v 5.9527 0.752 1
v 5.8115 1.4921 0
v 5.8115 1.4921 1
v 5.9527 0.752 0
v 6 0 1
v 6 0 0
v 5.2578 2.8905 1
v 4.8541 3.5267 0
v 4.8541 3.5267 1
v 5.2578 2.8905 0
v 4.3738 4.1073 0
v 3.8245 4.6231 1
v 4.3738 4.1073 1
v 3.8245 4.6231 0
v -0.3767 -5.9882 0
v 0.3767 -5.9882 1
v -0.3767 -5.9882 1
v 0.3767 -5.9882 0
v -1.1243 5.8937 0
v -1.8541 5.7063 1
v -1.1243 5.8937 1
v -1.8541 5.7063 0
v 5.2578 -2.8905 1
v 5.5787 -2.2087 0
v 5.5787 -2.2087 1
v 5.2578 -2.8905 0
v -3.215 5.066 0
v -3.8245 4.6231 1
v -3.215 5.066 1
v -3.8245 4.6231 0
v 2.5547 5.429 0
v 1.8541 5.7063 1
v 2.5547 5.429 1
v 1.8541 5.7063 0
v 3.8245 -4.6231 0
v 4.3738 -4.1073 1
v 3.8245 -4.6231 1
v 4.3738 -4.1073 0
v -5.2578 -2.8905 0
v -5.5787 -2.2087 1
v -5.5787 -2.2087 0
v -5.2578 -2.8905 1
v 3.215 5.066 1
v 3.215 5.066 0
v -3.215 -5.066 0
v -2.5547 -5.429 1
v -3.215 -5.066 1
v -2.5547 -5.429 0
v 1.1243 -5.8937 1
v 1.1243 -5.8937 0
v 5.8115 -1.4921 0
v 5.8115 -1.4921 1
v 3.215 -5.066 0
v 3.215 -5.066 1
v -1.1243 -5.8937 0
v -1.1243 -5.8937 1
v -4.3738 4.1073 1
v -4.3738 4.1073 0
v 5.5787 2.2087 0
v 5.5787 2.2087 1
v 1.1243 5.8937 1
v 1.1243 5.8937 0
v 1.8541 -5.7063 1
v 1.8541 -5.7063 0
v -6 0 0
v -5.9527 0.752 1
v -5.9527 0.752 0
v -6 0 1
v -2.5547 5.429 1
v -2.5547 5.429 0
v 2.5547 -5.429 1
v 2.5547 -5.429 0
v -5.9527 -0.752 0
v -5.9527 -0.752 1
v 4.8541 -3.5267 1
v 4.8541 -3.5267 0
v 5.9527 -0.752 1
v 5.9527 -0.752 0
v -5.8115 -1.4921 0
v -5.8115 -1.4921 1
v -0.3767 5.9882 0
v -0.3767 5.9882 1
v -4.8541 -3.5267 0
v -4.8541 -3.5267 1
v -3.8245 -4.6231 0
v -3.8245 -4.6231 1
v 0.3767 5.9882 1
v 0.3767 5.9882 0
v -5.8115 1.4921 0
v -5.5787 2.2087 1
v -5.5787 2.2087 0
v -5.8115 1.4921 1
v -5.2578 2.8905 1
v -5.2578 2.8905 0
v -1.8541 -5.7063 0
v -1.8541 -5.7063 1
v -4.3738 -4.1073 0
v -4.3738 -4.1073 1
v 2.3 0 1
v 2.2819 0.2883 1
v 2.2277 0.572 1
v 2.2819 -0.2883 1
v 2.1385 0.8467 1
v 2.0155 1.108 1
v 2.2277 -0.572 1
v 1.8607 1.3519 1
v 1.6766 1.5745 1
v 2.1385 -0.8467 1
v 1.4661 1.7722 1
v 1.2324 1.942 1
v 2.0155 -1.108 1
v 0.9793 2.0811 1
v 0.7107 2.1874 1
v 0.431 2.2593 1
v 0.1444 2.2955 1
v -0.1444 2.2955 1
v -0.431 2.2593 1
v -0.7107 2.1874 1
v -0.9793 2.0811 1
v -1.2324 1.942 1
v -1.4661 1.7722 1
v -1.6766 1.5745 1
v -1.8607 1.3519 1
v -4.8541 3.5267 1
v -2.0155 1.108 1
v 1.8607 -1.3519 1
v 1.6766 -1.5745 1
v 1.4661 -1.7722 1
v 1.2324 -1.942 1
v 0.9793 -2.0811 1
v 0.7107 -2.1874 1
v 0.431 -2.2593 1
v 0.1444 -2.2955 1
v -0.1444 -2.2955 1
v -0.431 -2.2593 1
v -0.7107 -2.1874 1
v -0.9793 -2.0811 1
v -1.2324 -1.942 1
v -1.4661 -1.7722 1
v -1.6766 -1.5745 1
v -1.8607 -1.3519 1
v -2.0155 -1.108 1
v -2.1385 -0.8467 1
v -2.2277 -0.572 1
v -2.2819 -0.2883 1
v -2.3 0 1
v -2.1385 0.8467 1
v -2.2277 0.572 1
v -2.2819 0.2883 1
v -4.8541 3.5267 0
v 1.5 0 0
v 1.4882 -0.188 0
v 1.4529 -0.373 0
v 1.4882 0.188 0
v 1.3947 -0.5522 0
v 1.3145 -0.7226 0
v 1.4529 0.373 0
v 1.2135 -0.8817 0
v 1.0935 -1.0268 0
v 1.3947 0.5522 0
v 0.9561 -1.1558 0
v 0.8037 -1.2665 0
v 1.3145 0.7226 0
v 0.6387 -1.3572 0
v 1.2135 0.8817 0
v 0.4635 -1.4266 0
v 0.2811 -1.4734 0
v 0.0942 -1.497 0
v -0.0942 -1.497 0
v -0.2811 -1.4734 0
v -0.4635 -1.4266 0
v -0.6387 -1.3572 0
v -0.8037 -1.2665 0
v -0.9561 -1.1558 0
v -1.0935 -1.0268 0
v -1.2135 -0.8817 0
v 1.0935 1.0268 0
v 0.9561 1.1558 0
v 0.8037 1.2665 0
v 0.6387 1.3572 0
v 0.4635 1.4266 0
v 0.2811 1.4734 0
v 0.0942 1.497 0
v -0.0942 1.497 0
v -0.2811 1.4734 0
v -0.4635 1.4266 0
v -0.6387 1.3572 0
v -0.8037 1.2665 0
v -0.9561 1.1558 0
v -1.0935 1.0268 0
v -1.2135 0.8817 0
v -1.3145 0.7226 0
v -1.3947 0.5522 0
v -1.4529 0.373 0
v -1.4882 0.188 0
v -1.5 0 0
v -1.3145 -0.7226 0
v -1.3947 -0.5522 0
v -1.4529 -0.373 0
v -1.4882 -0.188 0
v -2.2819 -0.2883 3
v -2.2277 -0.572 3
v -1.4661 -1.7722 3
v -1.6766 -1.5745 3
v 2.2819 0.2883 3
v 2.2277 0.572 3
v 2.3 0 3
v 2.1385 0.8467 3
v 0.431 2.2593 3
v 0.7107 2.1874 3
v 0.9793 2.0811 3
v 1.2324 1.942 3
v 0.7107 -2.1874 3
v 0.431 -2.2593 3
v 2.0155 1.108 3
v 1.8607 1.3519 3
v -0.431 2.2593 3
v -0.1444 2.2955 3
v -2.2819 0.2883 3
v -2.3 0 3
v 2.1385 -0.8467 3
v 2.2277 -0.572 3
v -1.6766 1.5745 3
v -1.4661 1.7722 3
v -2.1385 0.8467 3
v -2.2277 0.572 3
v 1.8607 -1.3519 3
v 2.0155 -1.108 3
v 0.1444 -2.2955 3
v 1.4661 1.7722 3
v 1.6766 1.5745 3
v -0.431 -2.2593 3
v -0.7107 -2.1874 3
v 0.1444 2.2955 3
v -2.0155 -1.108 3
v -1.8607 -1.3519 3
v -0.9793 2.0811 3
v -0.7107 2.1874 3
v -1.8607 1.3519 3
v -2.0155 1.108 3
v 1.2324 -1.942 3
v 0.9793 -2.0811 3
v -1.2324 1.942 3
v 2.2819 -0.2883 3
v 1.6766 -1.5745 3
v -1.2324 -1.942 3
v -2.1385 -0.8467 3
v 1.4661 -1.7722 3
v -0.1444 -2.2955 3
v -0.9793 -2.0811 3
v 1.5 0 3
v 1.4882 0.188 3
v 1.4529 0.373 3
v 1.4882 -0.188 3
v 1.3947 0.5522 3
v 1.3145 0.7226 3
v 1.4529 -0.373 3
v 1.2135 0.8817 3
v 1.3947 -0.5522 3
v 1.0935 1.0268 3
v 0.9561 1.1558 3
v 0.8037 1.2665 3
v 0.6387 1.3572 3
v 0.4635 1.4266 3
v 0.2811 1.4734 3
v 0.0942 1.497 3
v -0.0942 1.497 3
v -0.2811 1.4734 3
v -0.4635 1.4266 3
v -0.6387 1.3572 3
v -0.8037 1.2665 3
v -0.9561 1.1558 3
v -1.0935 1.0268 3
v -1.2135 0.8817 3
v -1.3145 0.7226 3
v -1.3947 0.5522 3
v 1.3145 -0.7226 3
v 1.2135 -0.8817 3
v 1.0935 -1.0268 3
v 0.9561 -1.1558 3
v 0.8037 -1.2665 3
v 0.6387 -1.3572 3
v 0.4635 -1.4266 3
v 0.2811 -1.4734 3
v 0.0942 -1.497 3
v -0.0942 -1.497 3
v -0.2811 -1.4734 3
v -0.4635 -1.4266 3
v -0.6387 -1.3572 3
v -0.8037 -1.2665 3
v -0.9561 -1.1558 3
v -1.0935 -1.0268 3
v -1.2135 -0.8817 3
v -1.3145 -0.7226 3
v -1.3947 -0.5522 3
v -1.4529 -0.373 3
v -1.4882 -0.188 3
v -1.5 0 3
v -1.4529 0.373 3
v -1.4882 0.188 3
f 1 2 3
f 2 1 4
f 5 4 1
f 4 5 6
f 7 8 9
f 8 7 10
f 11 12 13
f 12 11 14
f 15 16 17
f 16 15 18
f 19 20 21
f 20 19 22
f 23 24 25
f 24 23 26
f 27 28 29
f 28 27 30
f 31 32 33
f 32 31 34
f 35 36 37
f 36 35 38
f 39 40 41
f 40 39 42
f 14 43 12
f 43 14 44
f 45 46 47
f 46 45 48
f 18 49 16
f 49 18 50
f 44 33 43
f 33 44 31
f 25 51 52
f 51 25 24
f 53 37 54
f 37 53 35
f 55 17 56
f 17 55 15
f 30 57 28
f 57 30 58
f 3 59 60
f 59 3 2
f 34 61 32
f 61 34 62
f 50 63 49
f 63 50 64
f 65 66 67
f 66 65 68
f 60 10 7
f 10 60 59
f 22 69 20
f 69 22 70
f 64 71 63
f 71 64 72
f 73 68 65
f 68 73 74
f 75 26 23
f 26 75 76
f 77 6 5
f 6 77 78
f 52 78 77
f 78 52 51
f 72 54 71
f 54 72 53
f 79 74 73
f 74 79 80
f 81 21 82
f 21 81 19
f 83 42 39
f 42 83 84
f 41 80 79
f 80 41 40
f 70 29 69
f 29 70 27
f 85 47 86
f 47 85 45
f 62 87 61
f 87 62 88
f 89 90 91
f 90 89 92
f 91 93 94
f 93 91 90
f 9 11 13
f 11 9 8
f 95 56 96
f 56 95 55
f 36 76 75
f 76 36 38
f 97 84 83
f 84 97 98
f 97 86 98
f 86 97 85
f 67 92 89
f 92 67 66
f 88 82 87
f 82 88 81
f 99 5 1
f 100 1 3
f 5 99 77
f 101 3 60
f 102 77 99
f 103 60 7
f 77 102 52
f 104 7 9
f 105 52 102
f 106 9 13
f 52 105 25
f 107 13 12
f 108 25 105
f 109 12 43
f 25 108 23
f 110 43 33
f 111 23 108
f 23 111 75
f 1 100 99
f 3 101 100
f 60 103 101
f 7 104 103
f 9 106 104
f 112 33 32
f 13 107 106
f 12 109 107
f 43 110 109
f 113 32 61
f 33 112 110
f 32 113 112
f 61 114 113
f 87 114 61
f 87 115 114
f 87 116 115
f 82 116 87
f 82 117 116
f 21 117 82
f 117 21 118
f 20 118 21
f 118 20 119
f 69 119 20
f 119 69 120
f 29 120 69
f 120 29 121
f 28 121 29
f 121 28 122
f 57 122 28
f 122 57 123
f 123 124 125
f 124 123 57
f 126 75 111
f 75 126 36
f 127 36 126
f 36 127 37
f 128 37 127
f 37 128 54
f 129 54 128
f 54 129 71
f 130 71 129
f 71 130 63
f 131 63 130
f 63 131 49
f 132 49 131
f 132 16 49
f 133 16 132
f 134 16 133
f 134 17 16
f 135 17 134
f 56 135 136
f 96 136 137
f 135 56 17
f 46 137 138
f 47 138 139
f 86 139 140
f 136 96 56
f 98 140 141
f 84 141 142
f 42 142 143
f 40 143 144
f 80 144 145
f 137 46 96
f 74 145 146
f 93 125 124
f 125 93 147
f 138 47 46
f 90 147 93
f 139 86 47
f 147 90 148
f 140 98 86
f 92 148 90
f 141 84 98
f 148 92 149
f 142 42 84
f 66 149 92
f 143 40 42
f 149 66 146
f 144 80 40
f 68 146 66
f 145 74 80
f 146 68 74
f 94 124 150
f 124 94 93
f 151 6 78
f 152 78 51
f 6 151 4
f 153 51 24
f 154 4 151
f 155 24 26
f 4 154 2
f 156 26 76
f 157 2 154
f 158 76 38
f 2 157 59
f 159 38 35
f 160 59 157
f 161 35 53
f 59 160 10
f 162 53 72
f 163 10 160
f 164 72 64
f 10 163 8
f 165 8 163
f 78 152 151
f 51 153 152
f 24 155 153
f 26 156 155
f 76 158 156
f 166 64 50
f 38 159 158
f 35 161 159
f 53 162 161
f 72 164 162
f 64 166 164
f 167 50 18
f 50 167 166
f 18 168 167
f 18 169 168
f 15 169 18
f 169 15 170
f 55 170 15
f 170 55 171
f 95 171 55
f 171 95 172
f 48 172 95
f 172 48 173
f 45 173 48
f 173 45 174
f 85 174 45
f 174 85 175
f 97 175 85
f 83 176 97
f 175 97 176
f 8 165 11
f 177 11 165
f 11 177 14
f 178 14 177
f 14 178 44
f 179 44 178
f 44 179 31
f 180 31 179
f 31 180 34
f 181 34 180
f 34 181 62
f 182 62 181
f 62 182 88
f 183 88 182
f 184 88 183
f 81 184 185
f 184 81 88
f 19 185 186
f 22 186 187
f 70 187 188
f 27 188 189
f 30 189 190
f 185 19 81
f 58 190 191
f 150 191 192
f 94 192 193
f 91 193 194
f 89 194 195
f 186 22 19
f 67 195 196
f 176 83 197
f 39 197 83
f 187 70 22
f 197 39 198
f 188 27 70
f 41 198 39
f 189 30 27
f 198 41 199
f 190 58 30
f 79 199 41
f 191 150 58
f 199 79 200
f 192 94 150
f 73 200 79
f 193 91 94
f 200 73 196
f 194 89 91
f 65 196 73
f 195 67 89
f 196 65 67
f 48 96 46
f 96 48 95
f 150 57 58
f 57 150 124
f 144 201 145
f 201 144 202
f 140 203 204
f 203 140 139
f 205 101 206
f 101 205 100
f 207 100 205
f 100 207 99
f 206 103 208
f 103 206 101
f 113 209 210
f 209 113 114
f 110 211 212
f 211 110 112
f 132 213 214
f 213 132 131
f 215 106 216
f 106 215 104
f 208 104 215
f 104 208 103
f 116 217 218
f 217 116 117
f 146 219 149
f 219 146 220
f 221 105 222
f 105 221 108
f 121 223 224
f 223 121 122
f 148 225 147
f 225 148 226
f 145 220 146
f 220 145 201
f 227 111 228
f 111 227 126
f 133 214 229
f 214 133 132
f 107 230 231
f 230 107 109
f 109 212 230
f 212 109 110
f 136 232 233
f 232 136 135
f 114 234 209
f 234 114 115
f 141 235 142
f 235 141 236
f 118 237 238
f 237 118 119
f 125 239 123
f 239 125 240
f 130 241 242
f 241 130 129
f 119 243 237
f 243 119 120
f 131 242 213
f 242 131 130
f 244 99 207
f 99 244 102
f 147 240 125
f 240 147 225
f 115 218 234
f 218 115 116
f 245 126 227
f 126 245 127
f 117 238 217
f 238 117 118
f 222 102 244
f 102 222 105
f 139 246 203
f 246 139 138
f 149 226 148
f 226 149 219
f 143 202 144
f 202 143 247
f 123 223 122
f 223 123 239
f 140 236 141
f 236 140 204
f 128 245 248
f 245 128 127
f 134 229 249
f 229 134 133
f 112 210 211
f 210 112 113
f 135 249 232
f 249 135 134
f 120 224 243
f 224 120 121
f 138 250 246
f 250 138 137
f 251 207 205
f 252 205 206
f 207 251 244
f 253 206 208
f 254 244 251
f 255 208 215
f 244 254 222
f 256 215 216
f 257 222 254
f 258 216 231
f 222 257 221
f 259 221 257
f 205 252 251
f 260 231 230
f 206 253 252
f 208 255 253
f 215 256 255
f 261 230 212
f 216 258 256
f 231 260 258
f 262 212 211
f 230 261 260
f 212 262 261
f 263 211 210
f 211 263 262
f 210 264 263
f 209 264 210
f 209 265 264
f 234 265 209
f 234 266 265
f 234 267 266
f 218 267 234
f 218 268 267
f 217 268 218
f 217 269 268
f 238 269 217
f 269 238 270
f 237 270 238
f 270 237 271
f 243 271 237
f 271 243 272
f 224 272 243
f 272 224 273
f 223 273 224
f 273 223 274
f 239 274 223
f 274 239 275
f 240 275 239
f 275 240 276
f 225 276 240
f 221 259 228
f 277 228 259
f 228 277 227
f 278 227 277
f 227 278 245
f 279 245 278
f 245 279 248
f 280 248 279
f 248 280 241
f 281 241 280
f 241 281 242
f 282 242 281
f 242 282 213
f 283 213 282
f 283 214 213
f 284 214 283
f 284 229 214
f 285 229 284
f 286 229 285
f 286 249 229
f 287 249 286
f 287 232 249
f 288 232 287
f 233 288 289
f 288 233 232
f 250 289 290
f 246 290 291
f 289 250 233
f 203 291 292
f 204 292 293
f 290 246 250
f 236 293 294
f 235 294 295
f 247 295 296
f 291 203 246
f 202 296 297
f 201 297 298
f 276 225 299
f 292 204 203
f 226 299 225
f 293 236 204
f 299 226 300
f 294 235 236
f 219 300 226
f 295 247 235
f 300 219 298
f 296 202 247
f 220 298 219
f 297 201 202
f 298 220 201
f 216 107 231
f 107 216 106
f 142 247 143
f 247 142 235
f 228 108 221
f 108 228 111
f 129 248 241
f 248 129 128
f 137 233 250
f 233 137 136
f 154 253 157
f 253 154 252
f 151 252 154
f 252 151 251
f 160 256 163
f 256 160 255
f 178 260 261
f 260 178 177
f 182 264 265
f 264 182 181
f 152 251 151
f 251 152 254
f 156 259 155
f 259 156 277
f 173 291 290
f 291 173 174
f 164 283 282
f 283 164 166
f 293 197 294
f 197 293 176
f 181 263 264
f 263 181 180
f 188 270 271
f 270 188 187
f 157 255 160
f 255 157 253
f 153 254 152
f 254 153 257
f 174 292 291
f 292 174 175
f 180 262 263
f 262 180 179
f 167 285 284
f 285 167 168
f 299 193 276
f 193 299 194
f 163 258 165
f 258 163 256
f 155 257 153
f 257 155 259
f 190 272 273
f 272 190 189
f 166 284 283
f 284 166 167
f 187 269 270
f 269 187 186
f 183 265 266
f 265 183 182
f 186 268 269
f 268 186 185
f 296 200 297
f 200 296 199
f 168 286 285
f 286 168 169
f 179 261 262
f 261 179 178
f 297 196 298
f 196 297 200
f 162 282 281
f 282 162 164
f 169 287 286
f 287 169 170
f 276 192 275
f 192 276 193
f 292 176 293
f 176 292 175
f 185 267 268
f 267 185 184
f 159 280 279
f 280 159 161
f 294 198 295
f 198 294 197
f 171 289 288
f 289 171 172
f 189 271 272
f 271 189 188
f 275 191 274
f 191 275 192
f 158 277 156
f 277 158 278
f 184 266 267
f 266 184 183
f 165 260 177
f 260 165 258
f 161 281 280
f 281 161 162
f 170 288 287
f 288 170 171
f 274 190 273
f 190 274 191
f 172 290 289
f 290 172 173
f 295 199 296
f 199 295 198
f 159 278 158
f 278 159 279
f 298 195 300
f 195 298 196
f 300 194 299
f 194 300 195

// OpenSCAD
$fn=50;

difference() {
	union() {
		cylinder(d=12,h=1);
		cylinder(d=4.6,h=3);
	}
	cylinder(d=3,h=8);
}
